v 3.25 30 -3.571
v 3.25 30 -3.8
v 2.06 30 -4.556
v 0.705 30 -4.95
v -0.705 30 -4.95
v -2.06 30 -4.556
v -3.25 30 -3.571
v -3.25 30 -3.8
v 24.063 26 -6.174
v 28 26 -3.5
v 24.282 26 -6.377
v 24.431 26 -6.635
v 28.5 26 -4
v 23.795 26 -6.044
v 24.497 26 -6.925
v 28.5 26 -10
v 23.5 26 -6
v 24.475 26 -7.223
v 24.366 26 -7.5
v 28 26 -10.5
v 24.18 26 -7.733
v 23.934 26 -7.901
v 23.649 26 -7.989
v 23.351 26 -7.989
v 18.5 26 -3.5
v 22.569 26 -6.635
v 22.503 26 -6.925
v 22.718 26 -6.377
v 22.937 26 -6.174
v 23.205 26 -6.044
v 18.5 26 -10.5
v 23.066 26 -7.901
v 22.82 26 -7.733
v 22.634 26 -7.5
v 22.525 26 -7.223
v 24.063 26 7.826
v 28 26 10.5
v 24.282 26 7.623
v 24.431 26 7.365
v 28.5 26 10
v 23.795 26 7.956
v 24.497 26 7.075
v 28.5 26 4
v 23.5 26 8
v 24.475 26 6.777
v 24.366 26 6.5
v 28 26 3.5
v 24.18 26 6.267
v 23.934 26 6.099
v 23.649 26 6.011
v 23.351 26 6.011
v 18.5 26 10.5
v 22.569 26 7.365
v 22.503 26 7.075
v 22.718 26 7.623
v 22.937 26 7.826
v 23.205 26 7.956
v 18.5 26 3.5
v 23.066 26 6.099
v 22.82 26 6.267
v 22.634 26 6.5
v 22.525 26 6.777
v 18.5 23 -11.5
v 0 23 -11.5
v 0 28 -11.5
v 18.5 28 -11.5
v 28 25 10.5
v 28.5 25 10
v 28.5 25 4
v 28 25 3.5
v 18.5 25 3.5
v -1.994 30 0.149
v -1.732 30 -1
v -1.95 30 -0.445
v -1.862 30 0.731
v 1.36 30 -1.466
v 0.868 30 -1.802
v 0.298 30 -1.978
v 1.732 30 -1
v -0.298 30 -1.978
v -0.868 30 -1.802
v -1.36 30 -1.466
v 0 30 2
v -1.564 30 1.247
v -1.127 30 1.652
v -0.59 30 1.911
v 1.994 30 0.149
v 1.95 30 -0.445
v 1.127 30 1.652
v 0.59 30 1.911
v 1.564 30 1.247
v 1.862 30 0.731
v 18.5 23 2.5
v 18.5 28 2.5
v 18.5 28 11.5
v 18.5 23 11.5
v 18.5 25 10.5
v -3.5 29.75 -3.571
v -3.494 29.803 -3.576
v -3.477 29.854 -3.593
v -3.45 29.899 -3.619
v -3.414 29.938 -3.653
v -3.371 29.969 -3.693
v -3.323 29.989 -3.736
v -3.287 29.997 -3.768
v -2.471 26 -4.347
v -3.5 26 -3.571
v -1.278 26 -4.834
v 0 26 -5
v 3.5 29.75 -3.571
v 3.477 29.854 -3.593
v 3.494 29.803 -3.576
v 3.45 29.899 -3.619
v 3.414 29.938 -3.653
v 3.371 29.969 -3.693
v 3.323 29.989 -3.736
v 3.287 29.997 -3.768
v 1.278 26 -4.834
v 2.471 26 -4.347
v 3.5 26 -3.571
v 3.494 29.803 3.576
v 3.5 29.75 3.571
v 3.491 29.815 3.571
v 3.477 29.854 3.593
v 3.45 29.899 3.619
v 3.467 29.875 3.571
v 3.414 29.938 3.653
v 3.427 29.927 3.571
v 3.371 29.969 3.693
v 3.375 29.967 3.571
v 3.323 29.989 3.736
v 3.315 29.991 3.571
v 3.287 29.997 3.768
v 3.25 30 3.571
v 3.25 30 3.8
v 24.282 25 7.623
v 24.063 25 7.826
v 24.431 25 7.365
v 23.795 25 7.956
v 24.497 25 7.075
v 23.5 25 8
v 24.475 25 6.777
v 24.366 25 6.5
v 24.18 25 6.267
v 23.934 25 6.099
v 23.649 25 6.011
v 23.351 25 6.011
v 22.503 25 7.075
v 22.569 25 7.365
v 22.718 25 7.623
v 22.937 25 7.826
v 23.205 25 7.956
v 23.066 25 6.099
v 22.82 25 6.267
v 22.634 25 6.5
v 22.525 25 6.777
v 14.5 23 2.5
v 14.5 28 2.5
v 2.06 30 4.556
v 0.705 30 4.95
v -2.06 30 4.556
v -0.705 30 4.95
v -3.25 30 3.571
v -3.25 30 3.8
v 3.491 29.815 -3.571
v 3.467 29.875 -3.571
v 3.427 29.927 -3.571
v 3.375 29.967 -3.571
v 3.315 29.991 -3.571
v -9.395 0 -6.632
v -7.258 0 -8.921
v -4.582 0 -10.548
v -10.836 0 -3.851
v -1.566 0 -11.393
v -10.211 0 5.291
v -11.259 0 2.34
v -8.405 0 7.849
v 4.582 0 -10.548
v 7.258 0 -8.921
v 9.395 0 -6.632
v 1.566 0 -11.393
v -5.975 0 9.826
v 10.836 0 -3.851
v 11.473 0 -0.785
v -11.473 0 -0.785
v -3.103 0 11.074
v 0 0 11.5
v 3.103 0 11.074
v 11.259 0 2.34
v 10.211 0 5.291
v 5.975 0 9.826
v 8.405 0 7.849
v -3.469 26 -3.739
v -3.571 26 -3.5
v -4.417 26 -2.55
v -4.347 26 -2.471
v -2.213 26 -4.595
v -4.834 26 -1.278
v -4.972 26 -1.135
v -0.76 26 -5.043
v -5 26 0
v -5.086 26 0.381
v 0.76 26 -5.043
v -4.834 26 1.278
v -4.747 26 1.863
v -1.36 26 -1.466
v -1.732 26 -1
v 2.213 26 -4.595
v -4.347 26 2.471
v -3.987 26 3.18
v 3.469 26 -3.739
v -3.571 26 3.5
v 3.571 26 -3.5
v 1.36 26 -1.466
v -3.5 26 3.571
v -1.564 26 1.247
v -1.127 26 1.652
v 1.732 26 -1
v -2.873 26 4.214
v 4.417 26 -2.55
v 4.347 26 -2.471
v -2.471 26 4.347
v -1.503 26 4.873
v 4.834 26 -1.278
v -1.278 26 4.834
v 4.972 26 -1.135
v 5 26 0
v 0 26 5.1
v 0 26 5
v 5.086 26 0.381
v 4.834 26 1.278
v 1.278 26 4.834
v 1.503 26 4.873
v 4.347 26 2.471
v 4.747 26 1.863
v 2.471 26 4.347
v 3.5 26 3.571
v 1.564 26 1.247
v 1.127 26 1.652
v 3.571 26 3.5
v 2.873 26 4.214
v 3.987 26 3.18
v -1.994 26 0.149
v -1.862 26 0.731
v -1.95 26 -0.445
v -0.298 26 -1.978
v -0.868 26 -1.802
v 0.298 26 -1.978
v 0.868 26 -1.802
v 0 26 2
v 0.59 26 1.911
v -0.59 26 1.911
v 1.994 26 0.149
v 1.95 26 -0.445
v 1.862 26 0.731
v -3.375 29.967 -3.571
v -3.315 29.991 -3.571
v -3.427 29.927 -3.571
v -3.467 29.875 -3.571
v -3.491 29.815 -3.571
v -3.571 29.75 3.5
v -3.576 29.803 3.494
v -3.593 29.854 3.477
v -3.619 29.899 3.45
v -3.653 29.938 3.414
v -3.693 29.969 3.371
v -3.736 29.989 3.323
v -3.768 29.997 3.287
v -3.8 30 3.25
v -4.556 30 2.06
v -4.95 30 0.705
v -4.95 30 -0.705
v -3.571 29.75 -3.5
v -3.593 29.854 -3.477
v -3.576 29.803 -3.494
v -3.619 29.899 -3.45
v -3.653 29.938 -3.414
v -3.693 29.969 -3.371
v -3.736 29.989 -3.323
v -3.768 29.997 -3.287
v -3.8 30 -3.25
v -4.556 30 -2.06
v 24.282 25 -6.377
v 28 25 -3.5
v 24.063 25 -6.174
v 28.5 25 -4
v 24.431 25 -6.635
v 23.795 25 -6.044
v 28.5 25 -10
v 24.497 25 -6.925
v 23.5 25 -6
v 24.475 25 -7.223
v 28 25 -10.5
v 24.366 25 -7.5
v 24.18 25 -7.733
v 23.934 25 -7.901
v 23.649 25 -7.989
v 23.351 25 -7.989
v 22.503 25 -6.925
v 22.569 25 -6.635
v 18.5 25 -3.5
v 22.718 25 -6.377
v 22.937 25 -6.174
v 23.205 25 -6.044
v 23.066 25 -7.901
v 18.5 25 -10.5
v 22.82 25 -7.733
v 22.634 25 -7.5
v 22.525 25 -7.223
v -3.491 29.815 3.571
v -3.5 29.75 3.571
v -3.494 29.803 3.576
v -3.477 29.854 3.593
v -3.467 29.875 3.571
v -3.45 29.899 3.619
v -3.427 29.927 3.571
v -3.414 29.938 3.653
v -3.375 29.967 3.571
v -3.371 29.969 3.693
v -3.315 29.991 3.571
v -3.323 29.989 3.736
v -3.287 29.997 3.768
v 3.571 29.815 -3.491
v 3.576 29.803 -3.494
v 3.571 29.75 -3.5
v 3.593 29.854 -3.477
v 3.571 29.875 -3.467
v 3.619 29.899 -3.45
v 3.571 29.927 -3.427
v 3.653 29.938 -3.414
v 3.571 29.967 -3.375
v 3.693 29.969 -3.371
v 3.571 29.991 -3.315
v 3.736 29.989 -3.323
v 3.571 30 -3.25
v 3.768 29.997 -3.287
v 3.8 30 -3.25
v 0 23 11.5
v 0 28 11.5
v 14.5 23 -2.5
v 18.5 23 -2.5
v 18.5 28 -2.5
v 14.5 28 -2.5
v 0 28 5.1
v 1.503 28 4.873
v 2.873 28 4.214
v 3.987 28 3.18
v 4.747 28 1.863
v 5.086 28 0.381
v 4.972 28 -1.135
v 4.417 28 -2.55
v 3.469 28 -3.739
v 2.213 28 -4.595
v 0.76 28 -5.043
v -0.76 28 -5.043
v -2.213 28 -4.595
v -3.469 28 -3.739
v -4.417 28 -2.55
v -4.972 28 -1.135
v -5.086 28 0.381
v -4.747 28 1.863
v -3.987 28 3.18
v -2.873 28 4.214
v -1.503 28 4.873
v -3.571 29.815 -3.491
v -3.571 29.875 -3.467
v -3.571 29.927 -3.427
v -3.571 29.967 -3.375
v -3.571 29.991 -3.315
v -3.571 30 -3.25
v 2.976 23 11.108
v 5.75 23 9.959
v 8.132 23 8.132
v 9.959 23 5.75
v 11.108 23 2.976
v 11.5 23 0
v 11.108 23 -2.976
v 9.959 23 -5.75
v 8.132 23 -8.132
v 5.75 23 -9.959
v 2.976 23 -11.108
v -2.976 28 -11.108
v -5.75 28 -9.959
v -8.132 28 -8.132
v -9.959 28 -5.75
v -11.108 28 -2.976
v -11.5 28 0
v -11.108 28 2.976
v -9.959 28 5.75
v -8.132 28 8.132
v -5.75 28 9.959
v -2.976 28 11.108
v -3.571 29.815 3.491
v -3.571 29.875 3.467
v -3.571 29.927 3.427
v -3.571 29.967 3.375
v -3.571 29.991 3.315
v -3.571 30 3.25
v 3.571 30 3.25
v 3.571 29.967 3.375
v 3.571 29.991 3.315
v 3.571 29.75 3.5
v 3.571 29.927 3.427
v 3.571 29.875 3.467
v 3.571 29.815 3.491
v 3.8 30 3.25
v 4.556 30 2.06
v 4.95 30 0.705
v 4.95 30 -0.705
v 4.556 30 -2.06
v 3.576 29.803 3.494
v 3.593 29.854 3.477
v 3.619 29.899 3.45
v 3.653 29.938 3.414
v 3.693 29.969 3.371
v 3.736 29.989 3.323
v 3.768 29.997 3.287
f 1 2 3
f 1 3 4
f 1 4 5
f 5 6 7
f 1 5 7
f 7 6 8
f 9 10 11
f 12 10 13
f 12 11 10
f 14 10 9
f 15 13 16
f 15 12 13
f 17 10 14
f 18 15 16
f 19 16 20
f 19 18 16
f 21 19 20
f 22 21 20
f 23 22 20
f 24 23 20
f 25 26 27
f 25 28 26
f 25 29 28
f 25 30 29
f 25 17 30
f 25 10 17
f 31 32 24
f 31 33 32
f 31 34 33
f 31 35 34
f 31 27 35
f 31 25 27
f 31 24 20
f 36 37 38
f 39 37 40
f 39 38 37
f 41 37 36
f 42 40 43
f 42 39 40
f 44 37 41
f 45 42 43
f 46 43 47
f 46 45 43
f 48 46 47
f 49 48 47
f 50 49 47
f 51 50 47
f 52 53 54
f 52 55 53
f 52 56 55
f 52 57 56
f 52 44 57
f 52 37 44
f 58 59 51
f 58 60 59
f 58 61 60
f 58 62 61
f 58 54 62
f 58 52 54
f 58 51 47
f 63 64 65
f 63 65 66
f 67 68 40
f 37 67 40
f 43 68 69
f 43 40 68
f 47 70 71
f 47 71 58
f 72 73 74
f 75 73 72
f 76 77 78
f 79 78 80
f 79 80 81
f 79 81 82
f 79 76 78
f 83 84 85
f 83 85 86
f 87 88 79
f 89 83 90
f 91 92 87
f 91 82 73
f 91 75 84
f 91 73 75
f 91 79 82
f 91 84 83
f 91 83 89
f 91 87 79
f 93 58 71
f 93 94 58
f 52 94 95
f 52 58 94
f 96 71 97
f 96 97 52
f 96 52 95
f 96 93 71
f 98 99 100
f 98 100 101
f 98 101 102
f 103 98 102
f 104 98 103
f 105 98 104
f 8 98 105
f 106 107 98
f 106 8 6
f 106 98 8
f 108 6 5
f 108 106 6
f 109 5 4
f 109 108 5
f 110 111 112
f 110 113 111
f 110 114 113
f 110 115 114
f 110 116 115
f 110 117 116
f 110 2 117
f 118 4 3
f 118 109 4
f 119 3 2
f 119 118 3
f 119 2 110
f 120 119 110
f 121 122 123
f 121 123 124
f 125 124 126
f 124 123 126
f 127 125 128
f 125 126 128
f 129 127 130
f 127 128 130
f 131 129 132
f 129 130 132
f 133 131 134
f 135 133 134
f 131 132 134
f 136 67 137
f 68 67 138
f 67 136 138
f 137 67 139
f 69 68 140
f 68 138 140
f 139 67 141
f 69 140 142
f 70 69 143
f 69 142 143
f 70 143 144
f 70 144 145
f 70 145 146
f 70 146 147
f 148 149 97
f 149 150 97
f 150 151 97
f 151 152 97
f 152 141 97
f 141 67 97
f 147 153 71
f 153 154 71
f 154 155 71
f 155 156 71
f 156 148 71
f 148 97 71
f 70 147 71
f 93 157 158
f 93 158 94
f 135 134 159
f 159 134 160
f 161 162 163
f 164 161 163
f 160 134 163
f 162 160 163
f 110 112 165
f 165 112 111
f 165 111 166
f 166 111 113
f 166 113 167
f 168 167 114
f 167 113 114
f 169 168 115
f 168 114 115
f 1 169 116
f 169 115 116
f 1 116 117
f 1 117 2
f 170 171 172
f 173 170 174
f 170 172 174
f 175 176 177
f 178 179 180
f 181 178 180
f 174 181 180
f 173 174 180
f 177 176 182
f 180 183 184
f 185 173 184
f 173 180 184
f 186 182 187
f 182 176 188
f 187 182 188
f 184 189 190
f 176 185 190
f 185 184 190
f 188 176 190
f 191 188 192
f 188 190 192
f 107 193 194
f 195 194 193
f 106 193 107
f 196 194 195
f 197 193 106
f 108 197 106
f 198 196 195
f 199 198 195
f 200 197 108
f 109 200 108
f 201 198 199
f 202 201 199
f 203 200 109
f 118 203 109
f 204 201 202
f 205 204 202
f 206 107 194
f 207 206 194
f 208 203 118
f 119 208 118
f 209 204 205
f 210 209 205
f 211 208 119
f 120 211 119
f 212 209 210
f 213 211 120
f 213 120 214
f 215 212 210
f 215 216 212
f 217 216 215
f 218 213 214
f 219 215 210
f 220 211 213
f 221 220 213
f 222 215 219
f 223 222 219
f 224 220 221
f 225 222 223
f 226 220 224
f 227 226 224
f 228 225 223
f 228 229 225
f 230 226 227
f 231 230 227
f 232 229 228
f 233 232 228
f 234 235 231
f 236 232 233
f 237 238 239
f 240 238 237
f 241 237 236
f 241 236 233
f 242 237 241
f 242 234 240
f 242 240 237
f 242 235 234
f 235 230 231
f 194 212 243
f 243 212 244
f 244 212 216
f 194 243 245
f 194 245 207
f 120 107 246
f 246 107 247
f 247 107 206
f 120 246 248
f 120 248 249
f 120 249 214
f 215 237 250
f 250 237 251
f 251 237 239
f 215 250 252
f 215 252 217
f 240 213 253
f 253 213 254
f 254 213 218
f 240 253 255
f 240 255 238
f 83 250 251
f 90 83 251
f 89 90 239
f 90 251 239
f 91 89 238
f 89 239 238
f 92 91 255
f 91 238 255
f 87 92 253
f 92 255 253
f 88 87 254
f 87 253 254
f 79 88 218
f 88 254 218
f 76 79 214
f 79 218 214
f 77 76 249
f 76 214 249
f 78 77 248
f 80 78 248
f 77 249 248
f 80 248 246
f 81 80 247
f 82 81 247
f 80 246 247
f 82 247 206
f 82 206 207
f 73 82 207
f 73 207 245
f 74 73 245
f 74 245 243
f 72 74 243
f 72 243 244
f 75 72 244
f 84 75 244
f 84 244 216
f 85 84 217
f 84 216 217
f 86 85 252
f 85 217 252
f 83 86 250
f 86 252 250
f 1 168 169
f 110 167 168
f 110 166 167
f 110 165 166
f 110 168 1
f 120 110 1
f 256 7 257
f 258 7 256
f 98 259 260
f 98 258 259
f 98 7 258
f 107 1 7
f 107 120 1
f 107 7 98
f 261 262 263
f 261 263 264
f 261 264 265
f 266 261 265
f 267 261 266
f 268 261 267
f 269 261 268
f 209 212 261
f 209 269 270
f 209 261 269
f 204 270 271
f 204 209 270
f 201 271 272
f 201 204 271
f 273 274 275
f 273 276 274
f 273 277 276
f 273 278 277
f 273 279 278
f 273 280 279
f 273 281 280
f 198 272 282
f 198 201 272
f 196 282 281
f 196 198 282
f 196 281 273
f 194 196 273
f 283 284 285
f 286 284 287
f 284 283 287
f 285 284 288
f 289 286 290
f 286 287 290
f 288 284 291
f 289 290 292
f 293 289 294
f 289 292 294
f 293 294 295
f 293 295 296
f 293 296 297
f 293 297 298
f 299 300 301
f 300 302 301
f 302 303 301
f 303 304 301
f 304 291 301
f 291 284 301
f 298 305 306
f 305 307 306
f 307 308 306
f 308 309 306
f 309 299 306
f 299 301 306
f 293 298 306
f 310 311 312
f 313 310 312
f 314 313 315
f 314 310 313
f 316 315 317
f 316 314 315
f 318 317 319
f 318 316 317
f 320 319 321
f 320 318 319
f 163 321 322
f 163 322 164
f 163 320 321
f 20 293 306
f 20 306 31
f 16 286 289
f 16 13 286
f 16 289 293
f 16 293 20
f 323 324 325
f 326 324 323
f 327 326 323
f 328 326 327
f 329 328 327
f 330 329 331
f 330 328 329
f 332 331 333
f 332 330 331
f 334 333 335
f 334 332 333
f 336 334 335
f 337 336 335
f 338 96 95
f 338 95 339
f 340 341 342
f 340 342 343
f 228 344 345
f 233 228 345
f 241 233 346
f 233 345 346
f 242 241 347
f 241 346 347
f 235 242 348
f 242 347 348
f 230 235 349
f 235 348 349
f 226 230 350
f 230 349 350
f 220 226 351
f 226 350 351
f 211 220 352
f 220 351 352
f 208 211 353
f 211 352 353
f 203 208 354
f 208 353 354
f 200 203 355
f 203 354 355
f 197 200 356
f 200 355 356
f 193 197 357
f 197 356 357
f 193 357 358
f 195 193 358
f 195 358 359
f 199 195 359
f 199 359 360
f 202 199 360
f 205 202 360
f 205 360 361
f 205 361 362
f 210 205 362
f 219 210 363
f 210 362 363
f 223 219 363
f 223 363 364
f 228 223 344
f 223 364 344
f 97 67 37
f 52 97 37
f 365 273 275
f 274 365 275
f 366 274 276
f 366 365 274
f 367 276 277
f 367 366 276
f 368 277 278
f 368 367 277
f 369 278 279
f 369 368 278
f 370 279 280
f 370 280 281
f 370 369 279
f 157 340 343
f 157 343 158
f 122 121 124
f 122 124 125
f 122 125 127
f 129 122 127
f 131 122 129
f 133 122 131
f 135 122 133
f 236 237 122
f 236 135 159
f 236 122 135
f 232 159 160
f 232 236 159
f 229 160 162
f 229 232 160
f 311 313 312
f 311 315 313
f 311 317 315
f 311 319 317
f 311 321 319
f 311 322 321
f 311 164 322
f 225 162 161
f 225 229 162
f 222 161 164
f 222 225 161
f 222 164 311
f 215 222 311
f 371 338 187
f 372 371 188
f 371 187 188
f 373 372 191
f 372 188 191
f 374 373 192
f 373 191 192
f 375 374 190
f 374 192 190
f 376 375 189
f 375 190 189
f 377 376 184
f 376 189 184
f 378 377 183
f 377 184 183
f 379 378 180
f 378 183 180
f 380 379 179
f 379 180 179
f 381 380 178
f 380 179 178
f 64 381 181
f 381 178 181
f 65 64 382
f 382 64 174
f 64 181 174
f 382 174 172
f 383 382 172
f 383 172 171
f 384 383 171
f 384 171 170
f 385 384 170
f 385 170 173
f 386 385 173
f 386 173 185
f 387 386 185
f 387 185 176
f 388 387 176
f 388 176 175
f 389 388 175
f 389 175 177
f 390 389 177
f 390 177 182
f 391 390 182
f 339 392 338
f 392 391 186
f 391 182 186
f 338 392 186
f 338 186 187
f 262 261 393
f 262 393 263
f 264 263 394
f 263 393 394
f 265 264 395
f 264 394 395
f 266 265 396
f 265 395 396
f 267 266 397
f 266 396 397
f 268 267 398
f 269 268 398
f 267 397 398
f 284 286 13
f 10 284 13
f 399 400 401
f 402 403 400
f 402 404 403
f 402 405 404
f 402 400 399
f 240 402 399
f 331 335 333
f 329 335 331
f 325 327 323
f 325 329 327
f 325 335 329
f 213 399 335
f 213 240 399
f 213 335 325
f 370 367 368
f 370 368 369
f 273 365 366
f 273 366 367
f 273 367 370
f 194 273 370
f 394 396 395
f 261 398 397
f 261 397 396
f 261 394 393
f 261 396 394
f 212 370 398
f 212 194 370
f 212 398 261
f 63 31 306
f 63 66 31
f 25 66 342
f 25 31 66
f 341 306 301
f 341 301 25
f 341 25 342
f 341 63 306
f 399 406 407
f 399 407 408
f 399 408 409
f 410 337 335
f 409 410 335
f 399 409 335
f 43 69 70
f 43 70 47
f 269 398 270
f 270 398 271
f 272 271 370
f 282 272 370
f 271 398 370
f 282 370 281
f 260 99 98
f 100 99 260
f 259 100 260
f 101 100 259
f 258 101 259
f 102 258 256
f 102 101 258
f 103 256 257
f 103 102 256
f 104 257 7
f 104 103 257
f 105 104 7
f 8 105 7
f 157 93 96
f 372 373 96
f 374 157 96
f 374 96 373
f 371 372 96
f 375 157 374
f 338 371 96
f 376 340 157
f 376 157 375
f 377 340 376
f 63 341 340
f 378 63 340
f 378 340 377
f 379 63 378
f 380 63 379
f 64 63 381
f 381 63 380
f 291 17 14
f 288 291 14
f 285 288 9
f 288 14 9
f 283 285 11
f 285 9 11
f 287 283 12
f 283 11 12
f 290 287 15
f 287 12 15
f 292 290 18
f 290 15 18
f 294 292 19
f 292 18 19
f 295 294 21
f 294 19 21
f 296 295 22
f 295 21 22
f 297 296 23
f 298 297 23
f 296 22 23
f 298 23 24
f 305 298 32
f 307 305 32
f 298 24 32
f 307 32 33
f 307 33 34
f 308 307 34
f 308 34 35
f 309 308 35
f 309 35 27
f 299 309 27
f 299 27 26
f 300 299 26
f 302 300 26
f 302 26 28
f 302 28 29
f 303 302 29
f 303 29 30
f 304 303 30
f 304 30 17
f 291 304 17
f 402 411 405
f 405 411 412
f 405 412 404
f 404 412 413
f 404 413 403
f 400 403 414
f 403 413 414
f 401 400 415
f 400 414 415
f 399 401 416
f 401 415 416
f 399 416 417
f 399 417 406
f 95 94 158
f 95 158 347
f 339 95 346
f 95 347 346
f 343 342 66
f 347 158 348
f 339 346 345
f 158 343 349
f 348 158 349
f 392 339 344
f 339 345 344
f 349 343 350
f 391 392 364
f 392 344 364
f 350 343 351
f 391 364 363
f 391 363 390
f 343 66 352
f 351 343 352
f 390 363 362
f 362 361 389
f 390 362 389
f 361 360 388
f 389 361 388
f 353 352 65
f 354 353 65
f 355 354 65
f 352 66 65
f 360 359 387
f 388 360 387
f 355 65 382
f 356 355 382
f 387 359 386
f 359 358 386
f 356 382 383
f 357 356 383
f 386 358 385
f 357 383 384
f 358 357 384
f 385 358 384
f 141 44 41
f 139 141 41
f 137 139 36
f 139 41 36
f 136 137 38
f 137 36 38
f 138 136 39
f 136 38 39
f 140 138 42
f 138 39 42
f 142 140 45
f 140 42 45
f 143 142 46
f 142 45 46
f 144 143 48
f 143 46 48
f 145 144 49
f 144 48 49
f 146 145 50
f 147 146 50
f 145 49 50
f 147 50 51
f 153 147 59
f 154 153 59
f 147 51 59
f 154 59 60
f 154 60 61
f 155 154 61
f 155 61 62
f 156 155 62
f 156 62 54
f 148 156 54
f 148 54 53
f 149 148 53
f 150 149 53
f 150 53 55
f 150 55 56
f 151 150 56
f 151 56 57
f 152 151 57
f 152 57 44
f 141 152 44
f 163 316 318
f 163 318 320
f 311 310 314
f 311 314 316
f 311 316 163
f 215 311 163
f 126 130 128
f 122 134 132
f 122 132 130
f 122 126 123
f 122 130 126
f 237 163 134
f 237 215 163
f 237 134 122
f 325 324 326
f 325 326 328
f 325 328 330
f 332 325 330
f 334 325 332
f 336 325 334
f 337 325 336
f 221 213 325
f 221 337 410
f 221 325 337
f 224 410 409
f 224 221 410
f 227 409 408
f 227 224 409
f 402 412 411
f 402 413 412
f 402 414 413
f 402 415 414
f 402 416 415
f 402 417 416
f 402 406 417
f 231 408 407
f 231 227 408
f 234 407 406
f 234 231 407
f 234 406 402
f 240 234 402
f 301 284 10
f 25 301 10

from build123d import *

# Parameters (mm, degrees)
SKETCH_1_R               = 11.5
EXTRUDE_1_DEPTH          = 28
EXTRUDE_START            = -5
EXTRUDE_2_DEPTH          = 5
SKETCH_3_W               = 7
SKETCH_3_H               = 1
EXTRUDE_3_DEPTH          = 10
CHAMFER_1_SIZE           = 0.5
SKETCH_4_R               = 1
CUT_EXTRUDE_1_DEPTH      = 9
SKETCH_5_R               = 5.1
CUT_EXTRUDE_3_DEPTH      = 2
SKETCH_7_R               = 2
EXTRUDE_5_DEPTH          = 4
CUT_EXTRUDE_4_DEPTH      = 24
CUT_EXTRUDE_4_DEPTH_BACK = 4
CUT_EXTRUDE_5_DEPTH      = 24
CUT_EXTRUDE_5_DEPTH_BACK = 4


with BuildPart() as part:
    # Эскиз1 → Бобышка-Вытянуть1 (new body)
    with BuildSketch(Plane(origin=(0, 0, 0), x_dir=(1, 0, 0), z_dir=(0, 1, 0))):
        with Locations(Location((0, 0, 0), (0, 0, 270))):
            Circle(SKETCH_1_R)
    extrude(amount=EXTRUDE_1_DEPTH)

    # Эскиз2 → Бобышка-Вытянуть2 (add)
    with BuildSketch(Plane(origin=(0, 28, 0), x_dir=(1, 0, 0), z_dir=(0, 1, 0)).offset(EXTRUDE_START)):
        with BuildLine():
            Line((0, 11.5), (18.5, 11.5))
            Line((18.5, 11.5), (18.5, 2.5))
            Line((18.5, 2.5), (14.5, 2.5))
            Line((14.5, 2.5), (14.5, -2.5))
            Line((14.5, -2.5), (18.5, -2.5))
            Line((18.5, -2.5), (18.5, -11.5))
            Line((18.5, -11.5), (0, -11.5))
            ThreePointArc((0, -11.5), (11.5, 0), (0, 11.5))
        make_face()
    extrude(amount=EXTRUDE_2_DEPTH)

    # Эскиз3 → Бобышка-Вытянуть3 (add)
    with BuildSketch(Plane(origin=(18.5, 0, 0), x_dir=(0, 0, -1), z_dir=(1, 0, 0))):
        with Locations((-7, 25.5)):
            Rectangle(SKETCH_3_W, SKETCH_3_H)
        with Locations((7, 25.5)):
            Rectangle(SKETCH_3_W, SKETCH_3_H)
    extrude(amount=EXTRUDE_3_DEPTH)

    # Фаска1
    chamfer_1_edges = [part.edges().sort_by_distance(p)[0] for p in [
        (28.5, 25.5, 10.5),
        (28.5, 25.5, 3.5),
        (28.5, 25.5, -10.5),
        (28.5, 25.5, -3.5),
    ]]
    chamfer(chamfer_1_edges, length=CHAMFER_1_SIZE)

    # Эскиз4 → Вырез-Вытянуть1 (cut)
    with BuildSketch(Plane(origin=(0, 26, 0), x_dir=(1, 0, 0), z_dir=(0, 1, 0))):
        with Locations(Location((23.5, -7, 0), (0, 0, 270))):
            Circle(SKETCH_4_R)
        with Locations(Location((23.5, 7, 0), (0, 0, 270))):
            Circle(SKETCH_4_R)
    extrude(amount=-CUT_EXTRUDE_1_DEPTH, mode=Mode.SUBTRACT)

    # Эскиз5 → Вырез-Вытянуть3 (cut)
    with BuildSketch(Plane(origin=(0, 28, 0), x_dir=(1, 0, 0), z_dir=(0, 1, 0))):
        with Locations(Location((0, 0, 0), (0, 0, 270))):
            Circle(SKETCH_5_R)
    extrude(amount=-CUT_EXTRUDE_3_DEPTH, mode=Mode.SUBTRACT)

    # Эскиз7 → Бобышка-Вытянуть5 (add)
    with BuildSketch(Plane(origin=(0, 26, 0), x_dir=(1, 0, 0), z_dir=(0, 1, 0))):
        with Locations(Location((0, 0, 0), (0, 0, 270))):
            Circle(SKETCH_7_R)
        with BuildLine():
            Line((-3.570714214, 3.5), (-3.570714214, -3.5))
            ThreePointArc((-3.570714214, -3.5), (-5, 0), (-3.570714214, 3.5))
        make_face()
        with BuildLine():
            Line((3.5, 3.570714214), (-3.5, 3.570714214))
            ThreePointArc((-3.5, 3.570714214), (0, 5), (3.5, 3.570714214))
        make_face()
        with BuildLine():
            Line((3.570714214, -3.5), (3.570714214, 3.5))
            ThreePointArc((3.570714214, 3.5), (5, 0), (3.570714214, -3.5))
        make_face()
        with BuildLine():
            Line((-3.5, -3.570714214), (3.5, -3.570714214))
            ThreePointArc((3.5, -3.570714214), (0, -5), (-3.5, -3.570714214))
        make_face()
    extrude(amount=EXTRUDE_5_DEPTH)

    # Эскиз8 → Вырез-Вытянуть4 (cut, two sides: drawn at the far end of the back side and taken through both)
    with BuildSketch(Plane.ZY.offset(-3.570714214).offset(-CUT_EXTRUDE_4_DEPTH_BACK)):
        with BuildLine():
            Line((-3.5, 30), (-3.5, 29.75))
            ThreePointArc((-3.5, 29.75), (-3.426776695, 29.926776695), (-3.25, 30))
            Line((-3.25, 30), (-3.5, 30))
        make_face()
        with BuildLine():
            Line((3.25, 30), (3.5, 30))
            Line((3.5, 30), (3.5, 29.75))
            ThreePointArc((3.5, 29.75), (3.426776695, 29.926776695), (3.25, 30))
        make_face()
    extrude(amount=CUT_EXTRUDE_4_DEPTH + CUT_EXTRUDE_4_DEPTH_BACK, mode=Mode.SUBTRACT)

    # Эскиз9 → Вырез-Вытянуть5 (cut, two sides: drawn at the far end of the back side and taken through both)
    with BuildSketch(Plane.XY.offset(-3.570714214).offset(-CUT_EXTRUDE_5_DEPTH_BACK)):
        with BuildLine():
            Line((-3.5, 30), (-3.5, 29.75))
            ThreePointArc((-3.5, 29.75), (-3.426776695, 29.926776695), (-3.25, 30))
            Line((-3.25, 30), (-3.5, 30))
        make_face()
        with BuildLine():
            Line((3.25, 30), (3.5, 30))
            Line((3.5, 30), (3.5, 29.75))
            ThreePointArc((3.5, 29.75), (3.426776695, 29.926776695), (3.25, 30))
        make_face()
    extrude(amount=CUT_EXTRUDE_5_DEPTH + CUT_EXTRUDE_5_DEPTH_BACK, mode=Mode.SUBTRACT)


solid = part.part
